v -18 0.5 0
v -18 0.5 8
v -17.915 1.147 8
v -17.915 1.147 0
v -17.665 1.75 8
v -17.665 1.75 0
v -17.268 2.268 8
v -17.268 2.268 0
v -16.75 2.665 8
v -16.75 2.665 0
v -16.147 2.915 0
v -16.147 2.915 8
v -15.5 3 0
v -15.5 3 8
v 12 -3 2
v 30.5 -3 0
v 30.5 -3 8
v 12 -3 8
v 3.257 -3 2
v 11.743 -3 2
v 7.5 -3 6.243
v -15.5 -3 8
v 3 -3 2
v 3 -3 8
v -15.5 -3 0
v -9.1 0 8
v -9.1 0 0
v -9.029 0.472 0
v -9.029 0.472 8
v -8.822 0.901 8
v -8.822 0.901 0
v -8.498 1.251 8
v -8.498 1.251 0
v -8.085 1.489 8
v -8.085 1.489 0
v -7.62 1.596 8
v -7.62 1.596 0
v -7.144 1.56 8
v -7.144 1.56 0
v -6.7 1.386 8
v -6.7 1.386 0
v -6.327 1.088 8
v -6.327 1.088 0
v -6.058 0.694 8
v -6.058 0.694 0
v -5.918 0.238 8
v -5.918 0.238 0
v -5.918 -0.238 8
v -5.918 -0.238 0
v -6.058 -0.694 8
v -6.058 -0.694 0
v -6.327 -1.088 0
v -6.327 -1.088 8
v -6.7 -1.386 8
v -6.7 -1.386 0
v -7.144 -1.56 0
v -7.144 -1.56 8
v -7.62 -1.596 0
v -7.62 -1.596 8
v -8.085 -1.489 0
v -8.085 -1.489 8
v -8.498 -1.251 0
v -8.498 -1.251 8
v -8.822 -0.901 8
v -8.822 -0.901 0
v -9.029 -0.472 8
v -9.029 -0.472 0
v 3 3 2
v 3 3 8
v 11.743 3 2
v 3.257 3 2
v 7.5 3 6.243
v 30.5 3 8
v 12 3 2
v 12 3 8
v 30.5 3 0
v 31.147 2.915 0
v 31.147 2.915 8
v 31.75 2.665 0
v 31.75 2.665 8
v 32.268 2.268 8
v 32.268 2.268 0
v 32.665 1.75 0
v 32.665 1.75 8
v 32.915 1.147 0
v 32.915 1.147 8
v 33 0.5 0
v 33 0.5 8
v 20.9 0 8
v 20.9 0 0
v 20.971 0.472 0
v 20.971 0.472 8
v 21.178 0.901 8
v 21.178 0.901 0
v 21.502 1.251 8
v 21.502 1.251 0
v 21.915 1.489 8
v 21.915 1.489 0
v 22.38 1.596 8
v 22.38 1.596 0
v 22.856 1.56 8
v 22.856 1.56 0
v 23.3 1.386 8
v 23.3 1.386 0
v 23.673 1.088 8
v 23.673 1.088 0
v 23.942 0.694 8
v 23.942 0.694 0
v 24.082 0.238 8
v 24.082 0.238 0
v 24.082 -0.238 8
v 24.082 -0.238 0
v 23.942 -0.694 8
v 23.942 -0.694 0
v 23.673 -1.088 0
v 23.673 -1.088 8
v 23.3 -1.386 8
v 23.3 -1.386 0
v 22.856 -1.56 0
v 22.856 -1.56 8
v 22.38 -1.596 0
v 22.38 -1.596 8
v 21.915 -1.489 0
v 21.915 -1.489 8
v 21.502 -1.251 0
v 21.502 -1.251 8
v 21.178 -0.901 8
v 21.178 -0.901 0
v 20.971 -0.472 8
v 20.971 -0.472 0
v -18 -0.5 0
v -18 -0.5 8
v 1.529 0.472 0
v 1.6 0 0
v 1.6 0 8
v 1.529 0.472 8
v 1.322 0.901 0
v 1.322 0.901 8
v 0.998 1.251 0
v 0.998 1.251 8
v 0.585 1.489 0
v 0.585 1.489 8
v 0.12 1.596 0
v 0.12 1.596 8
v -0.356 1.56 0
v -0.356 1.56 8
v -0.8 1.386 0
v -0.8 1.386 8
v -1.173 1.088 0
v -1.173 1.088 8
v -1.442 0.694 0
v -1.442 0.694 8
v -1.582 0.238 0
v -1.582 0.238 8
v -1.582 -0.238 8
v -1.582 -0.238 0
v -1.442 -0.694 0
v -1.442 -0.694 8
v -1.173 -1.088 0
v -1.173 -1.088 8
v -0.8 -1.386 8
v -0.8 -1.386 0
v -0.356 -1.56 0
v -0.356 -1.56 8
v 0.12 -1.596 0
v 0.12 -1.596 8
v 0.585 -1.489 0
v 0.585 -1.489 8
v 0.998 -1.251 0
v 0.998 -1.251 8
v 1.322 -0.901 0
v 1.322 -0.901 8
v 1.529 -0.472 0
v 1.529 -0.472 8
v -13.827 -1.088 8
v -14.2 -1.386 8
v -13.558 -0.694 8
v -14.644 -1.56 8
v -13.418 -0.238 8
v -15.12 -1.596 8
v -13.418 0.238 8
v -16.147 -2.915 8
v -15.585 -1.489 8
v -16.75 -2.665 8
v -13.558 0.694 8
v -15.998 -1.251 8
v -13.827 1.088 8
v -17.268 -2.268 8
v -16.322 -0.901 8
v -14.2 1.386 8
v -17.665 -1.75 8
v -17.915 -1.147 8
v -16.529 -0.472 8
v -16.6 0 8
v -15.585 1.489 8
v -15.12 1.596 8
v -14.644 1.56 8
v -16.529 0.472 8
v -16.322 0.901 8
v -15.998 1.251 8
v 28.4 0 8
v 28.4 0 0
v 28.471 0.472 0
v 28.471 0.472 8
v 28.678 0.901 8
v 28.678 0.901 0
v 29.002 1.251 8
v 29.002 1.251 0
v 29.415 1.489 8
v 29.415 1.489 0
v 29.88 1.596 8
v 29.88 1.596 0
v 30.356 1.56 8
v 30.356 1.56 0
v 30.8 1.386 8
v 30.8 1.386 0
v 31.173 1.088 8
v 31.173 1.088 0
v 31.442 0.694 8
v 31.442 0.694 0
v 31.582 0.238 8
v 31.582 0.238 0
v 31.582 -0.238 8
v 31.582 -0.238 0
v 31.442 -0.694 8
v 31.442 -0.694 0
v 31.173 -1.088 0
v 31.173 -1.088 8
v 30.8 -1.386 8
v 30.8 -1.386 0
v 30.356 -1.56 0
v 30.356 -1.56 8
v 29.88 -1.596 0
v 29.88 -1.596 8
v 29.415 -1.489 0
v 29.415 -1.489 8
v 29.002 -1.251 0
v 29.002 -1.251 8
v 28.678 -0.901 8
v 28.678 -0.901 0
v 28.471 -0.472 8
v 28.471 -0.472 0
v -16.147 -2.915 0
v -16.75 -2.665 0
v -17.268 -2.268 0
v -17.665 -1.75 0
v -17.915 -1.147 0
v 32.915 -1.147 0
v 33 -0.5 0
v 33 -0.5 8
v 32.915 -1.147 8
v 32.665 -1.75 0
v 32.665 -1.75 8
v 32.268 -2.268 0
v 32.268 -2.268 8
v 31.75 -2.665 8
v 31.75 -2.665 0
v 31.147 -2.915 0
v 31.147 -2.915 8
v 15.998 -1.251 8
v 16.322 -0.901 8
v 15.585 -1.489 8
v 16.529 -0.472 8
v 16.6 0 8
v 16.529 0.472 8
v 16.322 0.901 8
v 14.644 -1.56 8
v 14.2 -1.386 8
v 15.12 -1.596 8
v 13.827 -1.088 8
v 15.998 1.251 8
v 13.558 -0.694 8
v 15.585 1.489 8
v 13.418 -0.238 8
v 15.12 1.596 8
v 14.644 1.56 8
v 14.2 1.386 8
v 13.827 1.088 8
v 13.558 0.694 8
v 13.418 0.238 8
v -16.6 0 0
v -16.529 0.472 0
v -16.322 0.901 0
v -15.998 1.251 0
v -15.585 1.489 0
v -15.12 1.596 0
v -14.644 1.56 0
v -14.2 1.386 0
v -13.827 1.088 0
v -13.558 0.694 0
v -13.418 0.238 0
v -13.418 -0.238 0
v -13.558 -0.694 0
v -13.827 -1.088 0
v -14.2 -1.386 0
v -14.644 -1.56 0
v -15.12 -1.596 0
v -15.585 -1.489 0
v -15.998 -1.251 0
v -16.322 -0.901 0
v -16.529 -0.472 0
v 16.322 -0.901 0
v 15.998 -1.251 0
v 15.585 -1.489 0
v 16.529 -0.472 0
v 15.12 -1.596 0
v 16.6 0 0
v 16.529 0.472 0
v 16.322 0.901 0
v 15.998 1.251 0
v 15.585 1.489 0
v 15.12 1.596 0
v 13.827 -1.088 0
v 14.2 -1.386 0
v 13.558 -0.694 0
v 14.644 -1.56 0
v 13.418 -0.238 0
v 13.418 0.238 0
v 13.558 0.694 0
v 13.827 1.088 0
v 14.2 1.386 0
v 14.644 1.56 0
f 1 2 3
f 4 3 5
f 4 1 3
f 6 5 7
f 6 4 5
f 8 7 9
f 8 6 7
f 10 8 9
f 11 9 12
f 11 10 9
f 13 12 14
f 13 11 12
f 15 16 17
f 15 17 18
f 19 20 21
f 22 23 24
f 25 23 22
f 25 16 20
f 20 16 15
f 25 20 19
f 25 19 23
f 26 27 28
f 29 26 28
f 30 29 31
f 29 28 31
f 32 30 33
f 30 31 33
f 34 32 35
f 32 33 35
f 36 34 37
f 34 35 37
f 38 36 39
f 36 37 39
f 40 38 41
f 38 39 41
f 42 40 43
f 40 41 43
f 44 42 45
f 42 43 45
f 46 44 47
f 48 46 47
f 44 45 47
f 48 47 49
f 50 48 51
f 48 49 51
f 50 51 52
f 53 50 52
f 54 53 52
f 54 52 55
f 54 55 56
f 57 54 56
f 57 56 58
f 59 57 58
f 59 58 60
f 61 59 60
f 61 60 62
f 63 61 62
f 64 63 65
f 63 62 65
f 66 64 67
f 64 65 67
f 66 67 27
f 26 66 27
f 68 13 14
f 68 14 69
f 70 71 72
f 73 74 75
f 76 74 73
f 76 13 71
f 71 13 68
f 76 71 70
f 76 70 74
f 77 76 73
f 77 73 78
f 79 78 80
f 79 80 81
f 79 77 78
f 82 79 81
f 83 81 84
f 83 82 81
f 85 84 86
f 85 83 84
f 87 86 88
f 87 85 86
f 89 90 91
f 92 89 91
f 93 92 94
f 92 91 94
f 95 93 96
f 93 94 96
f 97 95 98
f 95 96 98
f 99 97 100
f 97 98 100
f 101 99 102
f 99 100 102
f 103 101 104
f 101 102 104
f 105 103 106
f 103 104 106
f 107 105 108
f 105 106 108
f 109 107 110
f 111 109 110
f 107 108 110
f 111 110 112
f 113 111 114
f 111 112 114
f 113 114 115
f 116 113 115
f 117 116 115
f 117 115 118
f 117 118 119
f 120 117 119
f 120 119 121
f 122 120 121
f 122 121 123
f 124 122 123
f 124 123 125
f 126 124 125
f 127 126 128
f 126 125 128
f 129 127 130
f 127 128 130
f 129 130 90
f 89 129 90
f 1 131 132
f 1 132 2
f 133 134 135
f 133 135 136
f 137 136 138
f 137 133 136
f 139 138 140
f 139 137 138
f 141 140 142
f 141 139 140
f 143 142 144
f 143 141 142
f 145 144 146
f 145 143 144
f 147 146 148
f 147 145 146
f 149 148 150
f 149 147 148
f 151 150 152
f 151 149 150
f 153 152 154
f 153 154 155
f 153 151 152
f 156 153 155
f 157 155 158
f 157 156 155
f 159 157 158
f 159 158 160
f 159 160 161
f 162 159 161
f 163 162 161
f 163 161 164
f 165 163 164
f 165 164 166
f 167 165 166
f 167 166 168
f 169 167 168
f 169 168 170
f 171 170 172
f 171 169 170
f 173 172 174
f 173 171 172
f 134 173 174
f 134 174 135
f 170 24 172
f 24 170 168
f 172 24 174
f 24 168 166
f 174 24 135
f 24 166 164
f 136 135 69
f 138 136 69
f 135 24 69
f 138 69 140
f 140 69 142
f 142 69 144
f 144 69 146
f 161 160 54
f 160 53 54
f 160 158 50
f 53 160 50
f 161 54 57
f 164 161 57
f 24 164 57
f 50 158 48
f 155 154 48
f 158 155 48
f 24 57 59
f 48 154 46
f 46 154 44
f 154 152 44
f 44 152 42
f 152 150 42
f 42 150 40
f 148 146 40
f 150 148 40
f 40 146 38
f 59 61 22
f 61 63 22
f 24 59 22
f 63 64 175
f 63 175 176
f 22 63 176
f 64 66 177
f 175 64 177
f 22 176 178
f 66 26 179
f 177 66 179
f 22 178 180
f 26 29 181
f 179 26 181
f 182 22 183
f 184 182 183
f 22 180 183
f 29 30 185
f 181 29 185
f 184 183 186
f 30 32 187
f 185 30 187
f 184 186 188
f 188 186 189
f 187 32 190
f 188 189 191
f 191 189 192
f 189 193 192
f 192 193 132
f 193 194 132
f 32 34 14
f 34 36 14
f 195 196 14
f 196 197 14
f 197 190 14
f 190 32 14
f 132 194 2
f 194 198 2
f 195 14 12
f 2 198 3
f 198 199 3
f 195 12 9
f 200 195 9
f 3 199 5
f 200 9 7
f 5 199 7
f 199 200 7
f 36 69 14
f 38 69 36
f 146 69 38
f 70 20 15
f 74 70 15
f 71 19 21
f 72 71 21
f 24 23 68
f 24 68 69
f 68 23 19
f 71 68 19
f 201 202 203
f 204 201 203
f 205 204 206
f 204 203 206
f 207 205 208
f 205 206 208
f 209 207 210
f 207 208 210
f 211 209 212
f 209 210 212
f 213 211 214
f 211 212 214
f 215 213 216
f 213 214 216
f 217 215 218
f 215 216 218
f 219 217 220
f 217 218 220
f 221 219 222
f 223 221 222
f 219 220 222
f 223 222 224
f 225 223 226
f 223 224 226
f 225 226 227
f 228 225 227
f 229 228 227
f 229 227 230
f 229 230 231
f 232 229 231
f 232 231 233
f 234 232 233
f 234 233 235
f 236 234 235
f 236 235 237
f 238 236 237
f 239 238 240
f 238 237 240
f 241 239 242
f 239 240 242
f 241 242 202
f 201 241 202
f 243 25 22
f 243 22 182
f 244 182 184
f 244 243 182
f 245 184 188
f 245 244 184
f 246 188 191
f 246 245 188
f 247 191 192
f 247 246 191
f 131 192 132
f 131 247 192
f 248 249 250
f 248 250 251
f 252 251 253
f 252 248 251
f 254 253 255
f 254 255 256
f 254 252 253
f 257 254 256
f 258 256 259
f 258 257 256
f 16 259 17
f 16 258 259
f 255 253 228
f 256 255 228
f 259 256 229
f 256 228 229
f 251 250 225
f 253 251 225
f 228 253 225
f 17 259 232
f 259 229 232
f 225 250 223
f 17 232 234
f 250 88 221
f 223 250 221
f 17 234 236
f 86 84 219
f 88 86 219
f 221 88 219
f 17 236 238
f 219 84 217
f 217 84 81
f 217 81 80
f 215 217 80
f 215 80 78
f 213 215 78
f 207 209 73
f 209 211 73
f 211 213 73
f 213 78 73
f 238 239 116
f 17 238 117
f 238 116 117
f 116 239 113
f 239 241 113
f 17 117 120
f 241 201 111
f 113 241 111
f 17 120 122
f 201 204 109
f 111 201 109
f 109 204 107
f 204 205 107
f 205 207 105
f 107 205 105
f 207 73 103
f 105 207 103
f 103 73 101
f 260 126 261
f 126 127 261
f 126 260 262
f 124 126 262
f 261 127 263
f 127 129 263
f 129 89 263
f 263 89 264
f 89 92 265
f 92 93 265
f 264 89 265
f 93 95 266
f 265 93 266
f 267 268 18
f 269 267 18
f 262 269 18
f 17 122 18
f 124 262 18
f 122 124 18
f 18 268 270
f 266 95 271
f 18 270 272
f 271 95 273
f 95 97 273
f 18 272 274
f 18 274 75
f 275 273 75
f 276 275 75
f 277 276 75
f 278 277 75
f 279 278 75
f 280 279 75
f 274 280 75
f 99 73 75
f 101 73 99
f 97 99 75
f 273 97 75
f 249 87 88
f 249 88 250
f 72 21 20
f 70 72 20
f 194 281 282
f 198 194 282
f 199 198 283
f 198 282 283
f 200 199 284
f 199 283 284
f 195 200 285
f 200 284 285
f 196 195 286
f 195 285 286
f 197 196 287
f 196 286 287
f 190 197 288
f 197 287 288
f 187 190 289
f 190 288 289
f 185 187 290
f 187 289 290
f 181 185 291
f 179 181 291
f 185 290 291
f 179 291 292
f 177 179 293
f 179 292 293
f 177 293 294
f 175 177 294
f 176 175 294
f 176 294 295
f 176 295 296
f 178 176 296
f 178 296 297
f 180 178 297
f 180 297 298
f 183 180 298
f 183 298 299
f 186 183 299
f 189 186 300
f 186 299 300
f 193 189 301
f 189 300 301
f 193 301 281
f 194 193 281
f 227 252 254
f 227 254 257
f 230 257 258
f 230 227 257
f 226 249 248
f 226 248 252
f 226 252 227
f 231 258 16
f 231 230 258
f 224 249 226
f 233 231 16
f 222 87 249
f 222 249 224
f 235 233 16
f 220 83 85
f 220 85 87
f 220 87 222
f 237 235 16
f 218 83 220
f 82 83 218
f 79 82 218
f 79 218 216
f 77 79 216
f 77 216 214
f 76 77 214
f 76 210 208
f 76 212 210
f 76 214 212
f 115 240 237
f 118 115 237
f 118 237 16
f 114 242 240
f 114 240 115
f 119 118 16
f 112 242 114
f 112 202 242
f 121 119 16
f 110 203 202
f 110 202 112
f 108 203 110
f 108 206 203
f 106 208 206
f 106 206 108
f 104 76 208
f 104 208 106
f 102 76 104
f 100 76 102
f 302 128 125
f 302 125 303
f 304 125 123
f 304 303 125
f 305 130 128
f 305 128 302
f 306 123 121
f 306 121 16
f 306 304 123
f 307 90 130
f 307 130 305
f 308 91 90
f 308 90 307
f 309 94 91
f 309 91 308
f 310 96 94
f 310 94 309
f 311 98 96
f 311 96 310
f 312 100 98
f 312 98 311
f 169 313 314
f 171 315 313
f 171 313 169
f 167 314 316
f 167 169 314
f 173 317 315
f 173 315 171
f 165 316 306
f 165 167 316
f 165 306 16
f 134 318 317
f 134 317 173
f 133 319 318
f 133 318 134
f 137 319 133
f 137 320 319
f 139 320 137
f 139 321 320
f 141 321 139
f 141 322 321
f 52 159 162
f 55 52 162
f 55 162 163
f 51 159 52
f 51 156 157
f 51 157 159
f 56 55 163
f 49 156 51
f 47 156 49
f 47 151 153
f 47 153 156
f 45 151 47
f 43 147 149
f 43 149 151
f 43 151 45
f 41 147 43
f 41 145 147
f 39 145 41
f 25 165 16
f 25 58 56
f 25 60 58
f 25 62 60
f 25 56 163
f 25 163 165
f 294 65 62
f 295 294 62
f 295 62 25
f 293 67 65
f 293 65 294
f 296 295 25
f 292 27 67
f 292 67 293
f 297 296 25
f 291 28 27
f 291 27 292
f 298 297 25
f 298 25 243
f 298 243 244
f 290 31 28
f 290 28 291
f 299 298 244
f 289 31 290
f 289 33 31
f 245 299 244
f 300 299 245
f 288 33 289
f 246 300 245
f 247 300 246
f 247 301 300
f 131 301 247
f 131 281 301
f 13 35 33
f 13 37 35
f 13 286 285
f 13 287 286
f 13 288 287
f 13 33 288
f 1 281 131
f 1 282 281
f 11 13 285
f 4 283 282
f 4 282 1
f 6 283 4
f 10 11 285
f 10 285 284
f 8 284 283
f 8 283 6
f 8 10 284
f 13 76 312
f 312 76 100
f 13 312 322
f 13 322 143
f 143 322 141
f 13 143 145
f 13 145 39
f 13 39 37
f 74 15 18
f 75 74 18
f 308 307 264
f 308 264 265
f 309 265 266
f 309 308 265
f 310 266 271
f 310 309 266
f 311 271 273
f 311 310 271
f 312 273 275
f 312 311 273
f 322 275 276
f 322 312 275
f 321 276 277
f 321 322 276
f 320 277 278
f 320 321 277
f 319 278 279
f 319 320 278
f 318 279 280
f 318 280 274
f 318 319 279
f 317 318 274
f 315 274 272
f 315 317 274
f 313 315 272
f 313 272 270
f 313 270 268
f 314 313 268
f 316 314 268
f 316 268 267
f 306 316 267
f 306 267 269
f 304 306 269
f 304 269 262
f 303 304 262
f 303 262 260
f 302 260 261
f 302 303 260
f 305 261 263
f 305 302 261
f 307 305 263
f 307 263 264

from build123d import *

# Parameters (mm, degrees)
SKETCH1_R           = 1.6
BOSS_EXTRUDE1_DEPTH = 8
SKETCH2_W           = 9
SKETCH2_H           = 8.199711987
CUT_EXTRUDE1_DEPTH  = 8
BOSS_EXTRUDE2_DEPTH = 6
SKETCH4_R           = 1.6
BOSS_EXTRUDE3_DEPTH = 8


with BuildPart() as part:
    # Sketch1 → Boss-Extrude1 (new body)
    with BuildSketch(Plane.XY):
        with BuildLine():
            Line((-0.5, 3), (15.5, 3))
            ThreePointArc((15.5, 3), (17.267766953, 2.267766953), (18, 0.5))
            Line((18, 0.5), (18, -0.5))
            ThreePointArc((18, -0.5), (17.267766953, -2.267766953), (15.5, -3))
            Line((15.5, -3), (-0.5, -3))
            ThreePointArc((-0.5, -3), (-2.267766953, -2.267766953), (-3, -0.5))
            Line((-3, -0.5), (-3, 0.5))
            ThreePointArc((-3, 0.5), (-2.267766953, 2.267766953), (-0.5, 3))
        make_face()
        Circle(SKETCH1_R, mode=Mode.SUBTRACT)
        with Locations((15, 0)):
            Circle(SKETCH1_R, mode=Mode.SUBTRACT)
    extrude(amount=BOSS_EXTRUDE1_DEPTH)

    # Sketch2 → Cut-Extrude1 (cut)
    with BuildSketch(Plane.XZ.offset(3)):
        with Locations((7.5, 6.099855994)):
            Rectangle(SKETCH2_W, SKETCH2_H)
    extrude(amount=-CUT_EXTRUDE1_DEPTH, mode=Mode.SUBTRACT)

    # Sketch3 → Boss-Extrude2 (add)
    with BuildSketch(Plane.XZ.offset(3)):
        Polygon((3.257359313, 2), (7.5, 6.242640687), (11.742640687, 2), align=None)
    extrude(amount=-BOSS_EXTRUDE2_DEPTH)

    # Sketch4 → Boss-Extrude3 (add)
    with BuildSketch(Plane(origin=(0, 0, 0), x_dir=(-1, 0, 0), z_dir=(0, 0, -1))):
        with BuildLine():
            Line((15.5, 3), (0.5, 3))
            ThreePointArc((0.5, 3), (2.267766953, 2.267766953), (3, 0.5))
            Line((3, 0.5), (3, -0.5))
            ThreePointArc((3, -0.5), (2.267766953, -2.267766953), (0.5, -3))
            Line((0.5, -3), (15.5, -3))
            ThreePointArc((15.5, -3), (17.267766953, -2.267766953), (18, -0.5))
            Line((18, -0.5), (18, 0.5))
            ThreePointArc((18, 0.5), (17.267766953, 2.267766953), (15.5, 3))
        make_face()
        with Locations((7.5, 0)):
            Circle(SKETCH4_R, mode=Mode.SUBTRACT)
        with Locations((15, 0)):
            Circle(SKETCH4_R, mode=Mode.SUBTRACT)
        with BuildLine():
            ThreePointArc((-18, 0.5), (-17.267766953, 2.267766953), (-15.5, 3))
            Line((-15.5, 3), (-30.5, 3))
            ThreePointArc((-30.5, 3), (-32.267766953, 2.267766953), (-33, 0.5))
            Line((-33, 0.5), (-33, -0.5))
            ThreePointArc((-33, -0.5), (-32.267766953, -2.267766953), (-30.5, -3))
            Line((-30.5, -3), (-15.5, -3))
            ThreePointArc((-15.5, -3), (-17.267766953, -2.267766953), (-18, -0.5))
            Line((-18, -0.5), (-18, 0.5))
        make_face()
        with Locations((-30, 0)):
            Circle(SKETCH4_R, mode=Mode.SUBTRACT)
        with Locations((-22.5, 0)):
            Circle(SKETCH4_R, mode=Mode.SUBTRACT)
    extrude(amount=-BOSS_EXTRUDE3_DEPTH)


solid = part.part
